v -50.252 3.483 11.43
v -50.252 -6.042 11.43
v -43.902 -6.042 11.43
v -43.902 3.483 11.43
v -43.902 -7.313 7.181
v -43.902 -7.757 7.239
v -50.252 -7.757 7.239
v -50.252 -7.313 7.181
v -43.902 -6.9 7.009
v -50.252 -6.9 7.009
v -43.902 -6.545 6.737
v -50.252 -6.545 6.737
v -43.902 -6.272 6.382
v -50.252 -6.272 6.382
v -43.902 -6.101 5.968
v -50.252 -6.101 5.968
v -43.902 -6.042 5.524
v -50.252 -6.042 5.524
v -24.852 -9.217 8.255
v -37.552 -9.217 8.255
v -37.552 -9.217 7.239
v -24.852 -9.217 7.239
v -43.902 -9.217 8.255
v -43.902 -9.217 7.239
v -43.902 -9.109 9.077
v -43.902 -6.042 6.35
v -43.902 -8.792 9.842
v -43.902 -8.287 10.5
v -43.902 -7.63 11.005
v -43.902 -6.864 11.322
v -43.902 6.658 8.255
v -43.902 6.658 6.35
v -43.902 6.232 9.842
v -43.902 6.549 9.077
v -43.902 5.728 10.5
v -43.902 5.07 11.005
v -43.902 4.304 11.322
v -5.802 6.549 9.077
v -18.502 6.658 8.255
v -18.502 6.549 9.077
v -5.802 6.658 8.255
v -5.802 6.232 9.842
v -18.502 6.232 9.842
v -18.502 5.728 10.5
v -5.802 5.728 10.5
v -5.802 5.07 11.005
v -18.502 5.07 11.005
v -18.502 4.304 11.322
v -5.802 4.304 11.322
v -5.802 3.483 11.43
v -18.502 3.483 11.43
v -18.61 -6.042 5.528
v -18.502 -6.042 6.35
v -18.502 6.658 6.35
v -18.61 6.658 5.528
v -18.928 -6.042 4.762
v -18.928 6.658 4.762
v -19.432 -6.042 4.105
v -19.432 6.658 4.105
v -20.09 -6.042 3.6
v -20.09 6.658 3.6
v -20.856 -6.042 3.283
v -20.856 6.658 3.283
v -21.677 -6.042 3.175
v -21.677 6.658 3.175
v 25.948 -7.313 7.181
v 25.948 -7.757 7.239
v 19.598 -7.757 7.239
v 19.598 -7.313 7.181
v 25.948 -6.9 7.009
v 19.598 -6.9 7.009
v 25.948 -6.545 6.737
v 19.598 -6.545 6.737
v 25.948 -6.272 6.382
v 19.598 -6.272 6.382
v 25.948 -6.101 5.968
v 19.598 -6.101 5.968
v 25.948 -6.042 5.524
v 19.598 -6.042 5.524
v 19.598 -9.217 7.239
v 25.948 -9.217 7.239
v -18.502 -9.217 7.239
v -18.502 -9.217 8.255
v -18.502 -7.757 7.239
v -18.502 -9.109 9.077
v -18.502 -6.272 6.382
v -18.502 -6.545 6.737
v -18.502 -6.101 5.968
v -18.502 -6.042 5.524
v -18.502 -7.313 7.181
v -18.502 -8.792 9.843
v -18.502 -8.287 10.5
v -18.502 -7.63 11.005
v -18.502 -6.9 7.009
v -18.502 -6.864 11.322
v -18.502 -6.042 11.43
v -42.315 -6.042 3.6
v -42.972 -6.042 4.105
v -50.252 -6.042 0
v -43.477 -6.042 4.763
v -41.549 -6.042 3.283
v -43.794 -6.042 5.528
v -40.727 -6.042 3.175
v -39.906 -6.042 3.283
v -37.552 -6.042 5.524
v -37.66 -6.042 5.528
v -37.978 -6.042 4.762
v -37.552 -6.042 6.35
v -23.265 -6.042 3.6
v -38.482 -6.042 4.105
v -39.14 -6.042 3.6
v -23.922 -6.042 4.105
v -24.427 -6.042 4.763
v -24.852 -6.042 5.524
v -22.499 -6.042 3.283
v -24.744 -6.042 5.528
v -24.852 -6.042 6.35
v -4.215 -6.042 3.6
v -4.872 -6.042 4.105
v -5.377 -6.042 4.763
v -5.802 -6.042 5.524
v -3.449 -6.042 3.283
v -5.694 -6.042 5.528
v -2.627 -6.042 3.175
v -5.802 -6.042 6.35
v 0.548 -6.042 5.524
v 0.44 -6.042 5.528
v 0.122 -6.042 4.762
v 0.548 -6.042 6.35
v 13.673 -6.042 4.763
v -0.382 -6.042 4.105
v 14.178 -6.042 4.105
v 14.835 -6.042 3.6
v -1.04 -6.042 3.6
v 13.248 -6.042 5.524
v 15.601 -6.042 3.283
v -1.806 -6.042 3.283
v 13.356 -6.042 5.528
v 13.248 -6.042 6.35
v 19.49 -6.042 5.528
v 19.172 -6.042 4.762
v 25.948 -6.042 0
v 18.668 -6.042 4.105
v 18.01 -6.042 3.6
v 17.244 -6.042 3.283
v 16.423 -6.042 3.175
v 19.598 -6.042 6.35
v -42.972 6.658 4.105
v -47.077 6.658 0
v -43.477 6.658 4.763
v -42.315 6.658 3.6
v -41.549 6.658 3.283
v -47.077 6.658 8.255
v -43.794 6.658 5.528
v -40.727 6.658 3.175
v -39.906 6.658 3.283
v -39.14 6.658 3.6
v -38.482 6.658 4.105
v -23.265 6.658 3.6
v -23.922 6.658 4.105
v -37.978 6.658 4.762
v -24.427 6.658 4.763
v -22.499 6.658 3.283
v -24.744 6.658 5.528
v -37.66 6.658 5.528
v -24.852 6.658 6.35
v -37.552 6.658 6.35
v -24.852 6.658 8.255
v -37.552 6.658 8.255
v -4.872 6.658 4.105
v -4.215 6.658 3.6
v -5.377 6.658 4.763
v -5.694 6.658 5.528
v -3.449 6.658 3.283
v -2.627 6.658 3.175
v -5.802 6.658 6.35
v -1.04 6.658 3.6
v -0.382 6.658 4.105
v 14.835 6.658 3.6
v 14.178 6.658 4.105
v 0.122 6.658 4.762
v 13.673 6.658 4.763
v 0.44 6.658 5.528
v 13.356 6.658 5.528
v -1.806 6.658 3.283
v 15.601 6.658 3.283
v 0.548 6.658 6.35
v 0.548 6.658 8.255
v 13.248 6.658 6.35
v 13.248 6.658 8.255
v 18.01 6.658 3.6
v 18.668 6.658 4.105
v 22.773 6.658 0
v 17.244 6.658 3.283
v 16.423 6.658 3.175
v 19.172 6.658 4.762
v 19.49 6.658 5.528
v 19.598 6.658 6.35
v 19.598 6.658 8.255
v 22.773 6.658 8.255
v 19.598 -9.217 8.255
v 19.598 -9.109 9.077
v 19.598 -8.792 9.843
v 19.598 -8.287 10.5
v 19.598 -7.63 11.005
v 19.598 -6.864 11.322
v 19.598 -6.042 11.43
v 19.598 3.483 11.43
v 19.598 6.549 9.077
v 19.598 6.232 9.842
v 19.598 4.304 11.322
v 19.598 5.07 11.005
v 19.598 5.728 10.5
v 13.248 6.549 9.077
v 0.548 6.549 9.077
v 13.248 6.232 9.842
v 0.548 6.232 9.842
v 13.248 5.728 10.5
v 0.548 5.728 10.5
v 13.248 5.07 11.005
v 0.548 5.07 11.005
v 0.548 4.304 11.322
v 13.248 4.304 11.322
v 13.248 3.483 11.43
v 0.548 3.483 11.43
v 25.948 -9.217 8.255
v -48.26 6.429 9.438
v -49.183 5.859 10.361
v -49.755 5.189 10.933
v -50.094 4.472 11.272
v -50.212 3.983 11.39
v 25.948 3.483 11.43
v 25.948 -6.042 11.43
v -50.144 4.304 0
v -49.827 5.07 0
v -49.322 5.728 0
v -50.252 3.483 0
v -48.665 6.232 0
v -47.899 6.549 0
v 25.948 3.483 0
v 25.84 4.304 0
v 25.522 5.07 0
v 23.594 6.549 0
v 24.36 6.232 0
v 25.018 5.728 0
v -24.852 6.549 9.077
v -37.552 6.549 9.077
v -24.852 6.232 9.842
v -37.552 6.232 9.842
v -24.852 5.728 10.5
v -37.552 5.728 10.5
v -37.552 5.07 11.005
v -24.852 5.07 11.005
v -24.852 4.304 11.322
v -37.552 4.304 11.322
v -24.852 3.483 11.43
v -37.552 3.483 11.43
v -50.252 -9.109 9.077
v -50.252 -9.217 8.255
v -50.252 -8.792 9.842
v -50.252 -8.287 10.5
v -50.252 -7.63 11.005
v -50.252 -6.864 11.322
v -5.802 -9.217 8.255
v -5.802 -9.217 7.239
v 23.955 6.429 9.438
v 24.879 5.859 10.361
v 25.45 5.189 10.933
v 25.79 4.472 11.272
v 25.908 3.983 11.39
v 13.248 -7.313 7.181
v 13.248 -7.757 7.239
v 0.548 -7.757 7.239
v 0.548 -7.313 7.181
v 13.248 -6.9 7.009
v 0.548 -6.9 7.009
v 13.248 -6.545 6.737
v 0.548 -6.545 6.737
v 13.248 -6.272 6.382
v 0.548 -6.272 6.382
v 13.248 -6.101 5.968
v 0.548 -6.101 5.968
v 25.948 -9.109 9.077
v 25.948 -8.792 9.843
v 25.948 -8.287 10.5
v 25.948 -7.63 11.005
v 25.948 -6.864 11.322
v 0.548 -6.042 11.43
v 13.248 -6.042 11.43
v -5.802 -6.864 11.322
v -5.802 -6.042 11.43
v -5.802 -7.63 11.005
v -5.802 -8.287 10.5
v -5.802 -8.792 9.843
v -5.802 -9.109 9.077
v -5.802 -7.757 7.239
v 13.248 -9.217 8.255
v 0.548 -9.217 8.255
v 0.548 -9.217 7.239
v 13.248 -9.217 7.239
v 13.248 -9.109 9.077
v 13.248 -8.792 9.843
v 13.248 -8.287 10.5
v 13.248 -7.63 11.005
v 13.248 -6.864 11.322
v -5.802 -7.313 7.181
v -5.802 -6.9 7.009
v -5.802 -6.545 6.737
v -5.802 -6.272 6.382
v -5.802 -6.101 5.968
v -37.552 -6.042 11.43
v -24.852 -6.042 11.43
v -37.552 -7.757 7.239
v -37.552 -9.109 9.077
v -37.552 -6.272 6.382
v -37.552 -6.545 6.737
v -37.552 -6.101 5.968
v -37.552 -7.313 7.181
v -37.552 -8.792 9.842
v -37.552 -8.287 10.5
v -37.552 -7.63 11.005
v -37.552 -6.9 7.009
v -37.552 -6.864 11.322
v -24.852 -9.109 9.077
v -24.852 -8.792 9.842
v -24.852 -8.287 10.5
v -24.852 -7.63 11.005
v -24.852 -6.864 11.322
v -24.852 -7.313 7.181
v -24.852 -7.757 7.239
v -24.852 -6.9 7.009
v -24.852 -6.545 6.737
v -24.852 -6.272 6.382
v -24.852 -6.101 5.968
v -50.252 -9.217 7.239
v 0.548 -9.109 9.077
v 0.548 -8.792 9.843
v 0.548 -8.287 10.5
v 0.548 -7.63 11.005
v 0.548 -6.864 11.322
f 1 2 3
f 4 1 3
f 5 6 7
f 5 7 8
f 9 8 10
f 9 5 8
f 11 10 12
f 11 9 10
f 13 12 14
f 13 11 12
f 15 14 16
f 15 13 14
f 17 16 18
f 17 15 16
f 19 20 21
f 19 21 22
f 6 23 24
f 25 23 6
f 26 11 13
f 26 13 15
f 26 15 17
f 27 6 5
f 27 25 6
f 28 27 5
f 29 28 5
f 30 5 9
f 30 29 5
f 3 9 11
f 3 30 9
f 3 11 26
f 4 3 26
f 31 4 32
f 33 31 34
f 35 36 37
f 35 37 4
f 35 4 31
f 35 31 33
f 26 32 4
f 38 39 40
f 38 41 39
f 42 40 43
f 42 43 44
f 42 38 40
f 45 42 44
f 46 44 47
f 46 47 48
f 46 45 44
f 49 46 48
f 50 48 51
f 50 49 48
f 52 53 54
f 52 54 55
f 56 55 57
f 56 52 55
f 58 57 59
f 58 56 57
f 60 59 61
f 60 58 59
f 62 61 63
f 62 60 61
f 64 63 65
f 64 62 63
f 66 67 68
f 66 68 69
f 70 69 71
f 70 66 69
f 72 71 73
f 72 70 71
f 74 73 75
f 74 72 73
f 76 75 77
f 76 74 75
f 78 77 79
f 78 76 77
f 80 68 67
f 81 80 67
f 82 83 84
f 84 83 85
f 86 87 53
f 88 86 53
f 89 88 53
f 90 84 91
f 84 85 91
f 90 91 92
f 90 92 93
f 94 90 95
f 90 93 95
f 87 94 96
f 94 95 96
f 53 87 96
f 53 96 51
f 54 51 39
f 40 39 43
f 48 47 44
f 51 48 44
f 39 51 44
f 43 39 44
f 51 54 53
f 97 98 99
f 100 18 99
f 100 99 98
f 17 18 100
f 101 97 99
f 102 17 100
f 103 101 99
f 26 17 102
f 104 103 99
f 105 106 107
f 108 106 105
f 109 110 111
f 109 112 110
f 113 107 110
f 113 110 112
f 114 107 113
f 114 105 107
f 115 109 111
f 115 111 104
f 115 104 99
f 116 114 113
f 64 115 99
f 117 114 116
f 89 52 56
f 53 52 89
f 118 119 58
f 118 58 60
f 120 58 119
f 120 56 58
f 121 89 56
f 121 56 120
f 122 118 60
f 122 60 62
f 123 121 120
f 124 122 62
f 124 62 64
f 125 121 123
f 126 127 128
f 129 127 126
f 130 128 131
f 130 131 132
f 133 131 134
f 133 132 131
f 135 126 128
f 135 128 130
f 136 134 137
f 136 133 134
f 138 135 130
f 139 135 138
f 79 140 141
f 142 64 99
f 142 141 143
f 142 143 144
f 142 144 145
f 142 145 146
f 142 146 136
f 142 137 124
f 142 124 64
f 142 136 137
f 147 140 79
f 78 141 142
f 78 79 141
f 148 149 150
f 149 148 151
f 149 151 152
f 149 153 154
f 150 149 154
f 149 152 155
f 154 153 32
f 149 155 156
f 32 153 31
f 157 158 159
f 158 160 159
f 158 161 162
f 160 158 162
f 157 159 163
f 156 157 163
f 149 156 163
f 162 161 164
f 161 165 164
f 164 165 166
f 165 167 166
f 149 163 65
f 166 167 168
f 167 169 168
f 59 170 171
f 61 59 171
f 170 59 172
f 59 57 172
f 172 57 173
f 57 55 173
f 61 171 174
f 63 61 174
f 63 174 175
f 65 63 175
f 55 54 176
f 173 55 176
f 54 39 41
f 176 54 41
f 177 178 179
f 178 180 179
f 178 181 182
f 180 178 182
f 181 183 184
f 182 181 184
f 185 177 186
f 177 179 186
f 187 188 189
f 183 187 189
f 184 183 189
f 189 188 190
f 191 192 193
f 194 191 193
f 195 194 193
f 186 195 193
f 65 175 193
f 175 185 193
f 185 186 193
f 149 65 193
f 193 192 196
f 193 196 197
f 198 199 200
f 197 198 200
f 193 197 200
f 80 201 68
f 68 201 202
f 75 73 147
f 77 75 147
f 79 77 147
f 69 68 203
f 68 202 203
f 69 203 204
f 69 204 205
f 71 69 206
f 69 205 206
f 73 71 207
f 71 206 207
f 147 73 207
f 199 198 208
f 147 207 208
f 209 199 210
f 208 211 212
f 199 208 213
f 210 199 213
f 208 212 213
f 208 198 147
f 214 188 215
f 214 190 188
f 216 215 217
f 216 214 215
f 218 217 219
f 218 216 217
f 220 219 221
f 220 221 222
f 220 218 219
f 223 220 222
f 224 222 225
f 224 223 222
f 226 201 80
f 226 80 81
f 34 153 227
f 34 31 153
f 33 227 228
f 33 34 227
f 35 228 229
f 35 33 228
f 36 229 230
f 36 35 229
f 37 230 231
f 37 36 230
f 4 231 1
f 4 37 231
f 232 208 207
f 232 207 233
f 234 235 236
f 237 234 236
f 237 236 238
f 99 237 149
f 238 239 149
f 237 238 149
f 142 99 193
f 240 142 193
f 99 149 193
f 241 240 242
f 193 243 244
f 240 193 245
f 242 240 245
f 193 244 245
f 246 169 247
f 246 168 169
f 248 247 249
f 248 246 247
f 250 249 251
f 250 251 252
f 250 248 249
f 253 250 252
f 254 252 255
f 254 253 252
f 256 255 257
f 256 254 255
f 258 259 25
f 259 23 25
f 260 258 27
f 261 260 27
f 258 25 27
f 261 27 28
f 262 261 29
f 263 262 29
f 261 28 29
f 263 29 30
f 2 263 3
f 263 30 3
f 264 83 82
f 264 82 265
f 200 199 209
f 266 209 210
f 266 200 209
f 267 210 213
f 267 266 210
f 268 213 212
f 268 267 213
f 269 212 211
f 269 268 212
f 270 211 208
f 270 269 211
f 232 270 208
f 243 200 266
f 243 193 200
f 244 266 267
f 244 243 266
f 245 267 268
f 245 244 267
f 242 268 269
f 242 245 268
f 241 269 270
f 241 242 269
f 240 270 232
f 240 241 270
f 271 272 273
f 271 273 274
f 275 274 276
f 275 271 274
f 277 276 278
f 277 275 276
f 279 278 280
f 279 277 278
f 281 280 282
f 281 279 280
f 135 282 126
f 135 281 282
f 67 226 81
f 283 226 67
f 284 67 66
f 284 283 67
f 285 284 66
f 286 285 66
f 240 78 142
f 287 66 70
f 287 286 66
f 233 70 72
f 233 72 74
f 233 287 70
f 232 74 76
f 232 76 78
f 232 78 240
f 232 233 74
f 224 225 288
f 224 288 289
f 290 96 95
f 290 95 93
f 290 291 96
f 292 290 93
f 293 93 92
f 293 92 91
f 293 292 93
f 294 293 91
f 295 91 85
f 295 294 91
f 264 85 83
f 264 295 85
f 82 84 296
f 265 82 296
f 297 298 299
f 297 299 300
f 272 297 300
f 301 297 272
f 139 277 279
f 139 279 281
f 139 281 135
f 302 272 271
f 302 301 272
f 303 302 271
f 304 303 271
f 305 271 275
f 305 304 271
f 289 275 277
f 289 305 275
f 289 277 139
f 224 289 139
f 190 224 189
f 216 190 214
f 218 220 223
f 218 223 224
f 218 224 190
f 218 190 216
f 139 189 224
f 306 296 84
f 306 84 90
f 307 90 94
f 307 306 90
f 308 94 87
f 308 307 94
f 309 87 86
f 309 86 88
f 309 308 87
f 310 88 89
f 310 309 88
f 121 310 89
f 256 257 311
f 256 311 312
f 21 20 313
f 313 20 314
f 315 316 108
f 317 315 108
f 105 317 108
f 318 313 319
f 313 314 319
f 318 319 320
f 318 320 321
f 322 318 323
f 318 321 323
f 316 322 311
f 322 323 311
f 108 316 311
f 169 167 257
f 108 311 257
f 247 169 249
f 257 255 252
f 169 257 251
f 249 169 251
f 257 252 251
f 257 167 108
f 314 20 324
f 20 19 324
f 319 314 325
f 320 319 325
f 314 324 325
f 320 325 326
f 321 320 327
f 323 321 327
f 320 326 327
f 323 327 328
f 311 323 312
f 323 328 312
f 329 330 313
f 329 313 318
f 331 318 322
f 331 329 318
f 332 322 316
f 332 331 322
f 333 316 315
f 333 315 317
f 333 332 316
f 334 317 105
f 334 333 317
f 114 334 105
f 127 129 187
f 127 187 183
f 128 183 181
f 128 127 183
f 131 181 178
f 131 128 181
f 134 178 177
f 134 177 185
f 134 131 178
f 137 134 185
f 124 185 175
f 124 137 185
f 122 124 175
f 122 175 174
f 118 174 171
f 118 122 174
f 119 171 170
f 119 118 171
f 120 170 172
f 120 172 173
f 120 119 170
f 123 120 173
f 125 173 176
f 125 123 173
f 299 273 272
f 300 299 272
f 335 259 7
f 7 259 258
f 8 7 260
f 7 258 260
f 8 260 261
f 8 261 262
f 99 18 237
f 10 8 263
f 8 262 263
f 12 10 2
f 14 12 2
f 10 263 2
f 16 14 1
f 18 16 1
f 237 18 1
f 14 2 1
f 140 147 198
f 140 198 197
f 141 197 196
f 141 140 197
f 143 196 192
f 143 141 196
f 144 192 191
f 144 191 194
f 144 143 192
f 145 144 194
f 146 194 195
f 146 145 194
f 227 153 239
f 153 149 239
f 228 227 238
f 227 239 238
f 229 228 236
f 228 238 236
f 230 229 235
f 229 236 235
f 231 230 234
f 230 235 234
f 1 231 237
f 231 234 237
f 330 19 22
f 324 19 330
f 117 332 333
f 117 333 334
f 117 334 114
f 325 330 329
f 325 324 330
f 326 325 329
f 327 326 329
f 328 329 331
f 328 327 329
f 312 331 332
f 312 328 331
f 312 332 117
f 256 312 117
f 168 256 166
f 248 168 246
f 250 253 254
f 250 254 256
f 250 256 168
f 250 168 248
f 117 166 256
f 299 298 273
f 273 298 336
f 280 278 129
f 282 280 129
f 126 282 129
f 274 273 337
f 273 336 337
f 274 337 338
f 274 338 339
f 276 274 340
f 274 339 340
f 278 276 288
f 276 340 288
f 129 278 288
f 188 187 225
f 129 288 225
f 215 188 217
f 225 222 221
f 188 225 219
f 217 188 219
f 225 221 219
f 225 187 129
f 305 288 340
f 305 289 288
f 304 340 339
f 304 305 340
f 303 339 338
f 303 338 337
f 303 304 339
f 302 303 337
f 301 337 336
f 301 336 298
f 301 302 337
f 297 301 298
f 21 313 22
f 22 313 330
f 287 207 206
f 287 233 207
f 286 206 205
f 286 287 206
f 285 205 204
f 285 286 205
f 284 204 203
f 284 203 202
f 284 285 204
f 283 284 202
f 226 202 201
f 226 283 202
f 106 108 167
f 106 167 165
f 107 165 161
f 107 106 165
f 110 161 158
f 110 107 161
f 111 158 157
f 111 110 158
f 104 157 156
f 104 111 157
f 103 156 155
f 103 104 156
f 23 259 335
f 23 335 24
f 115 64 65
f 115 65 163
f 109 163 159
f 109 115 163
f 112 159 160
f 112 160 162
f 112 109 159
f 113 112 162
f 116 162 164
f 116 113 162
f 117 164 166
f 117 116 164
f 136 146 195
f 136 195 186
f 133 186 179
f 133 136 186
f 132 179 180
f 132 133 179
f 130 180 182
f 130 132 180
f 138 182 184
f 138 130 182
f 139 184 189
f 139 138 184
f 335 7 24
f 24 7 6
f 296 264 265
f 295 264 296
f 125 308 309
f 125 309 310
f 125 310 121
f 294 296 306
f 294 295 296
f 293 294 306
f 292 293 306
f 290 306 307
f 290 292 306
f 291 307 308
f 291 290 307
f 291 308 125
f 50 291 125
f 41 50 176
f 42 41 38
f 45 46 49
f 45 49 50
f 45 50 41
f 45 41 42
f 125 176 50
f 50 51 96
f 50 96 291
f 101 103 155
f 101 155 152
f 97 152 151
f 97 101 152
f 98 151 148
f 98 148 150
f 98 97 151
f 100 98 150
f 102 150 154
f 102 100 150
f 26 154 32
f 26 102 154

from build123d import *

# Parameters (mm, degrees)
F0_W      = 76.2
F0_H      = 12.7
F1_DEPTH  = 3.175
F2_W      = 6.35
F2_H      = 12.7
F2_W_2    = 12.7
F3_DEPTH  = 8.255
F4_W      = 6.35
F4_H      = 4.191
F4_W_2    = 12.7
F5_DEPTH  = 3.175
F7_DEPTH  = 6.35
F9_DEPTH  = 12.7
F11_DEPTH = 12.7
F13_DEPTH = 12.7
F15_DEPTH = 6.35
F17_DEPTH = 12.7
F18_R     = 3.175


with BuildPart() as f1:
    # F0 (on Top) → F1 (new body)
    with BuildSketch(Plane.XY):
        with Locations((-12.1522513986, 0.3075693393)):
            Rectangle(F0_W, F0_H)
    extrude(amount=F1_DEPTH)

    # F2 (on face) → F3 (join)
    with BuildSketch(Plane.XY.offset(3.175)):
        with Locations((-47.0772513986, 0.3075693393)):
            Rectangle(F2_W, F2_H)
        with Locations((-31.2022513986, 0.3075693393)):
            Rectangle(F2_W_2, F2_H)
        with Locations((-12.1522513986, 0.3075693393)):
            Rectangle(F2_W_2, F2_H)
        with Locations((6.8977486014, 0.3075693393)):
            Rectangle(F2_W_2, F2_H)
        with Locations((22.7727486014, 0.3075693393)):
            Rectangle(F2_W, F2_H)
    extrude(amount=F3_DEPTH)

    # F4 (on face) → F5 (join)
    with BuildSketch(Plane.XZ.offset(6.0424306607)):
        with Locations((-47.0772513986, 9.3345)):
            Rectangle(F4_W, F4_H)
        with Locations((-31.2022513986, 9.3345)):
            Rectangle(F4_W_2, F4_H)
        with Locations((-12.1522513986, 9.3345)):
            Rectangle(F4_W_2, F4_H)
        with Locations((6.8977486014, 9.3345)):
            Rectangle(F4_W_2, F4_H)
        with Locations((22.7727486014, 9.3345)):
            Rectangle(F4_W, F4_H)
    extrude(amount=F5_DEPTH)

    # F6 (on face) → F7 (join)
    with BuildSketch(Plane.YZ.offset(25.9477486014)):
        with BuildLine():
            Line((-6.0424306607, 7.239), (-7.7569306607, 7.239))
            ThreePointArc((-7.7569306607, 7.239), (-6.5445960844, 6.7368345763), (-6.0424306607, 5.5245))
            Line((-6.0424306607, 5.5245), (-6.0424306607, 7.239))
        make_face()
    extrude(amount=-F7_DEPTH)

    # F8 (on face) → F9 (join)
    with BuildSketch(Plane.YZ.offset(13.2477486014)):
        with BuildLine():
            Line((-6.0424306607, 7.239), (-7.7569306607, 7.239))
            ThreePointArc((-7.7569306607, 7.239), (-6.5445960844, 6.7368345763), (-6.0424306607, 5.5245))
            Line((-6.0424306607, 5.5245), (-6.0424306607, 7.239))
        make_face()
    extrude(amount=-F9_DEPTH)

    # F10 (on face) → F11 (join)
    with BuildSketch(Plane.YZ.offset(-5.8022513986)):
        with BuildLine():
            Line((-6.0424306607, 7.239), (-7.7569306607, 7.239))
            ThreePointArc((-7.7569306607, 7.239), (-6.5445960844, 6.7368345763), (-6.0424306607, 5.5245))
            Line((-6.0424306607, 5.5245), (-6.0424306607, 7.239))
        make_face()
    extrude(amount=-F11_DEPTH)

    # F12 (on face) → F13 (join)
    with BuildSketch(Plane.YZ.offset(-24.8522513986)):
        with BuildLine():
            Line((-6.0424306607, 7.239), (-7.7569306607, 7.239))
            ThreePointArc((-7.7569306607, 7.239), (-6.5445960844, 6.7368345763), (-6.0424306607, 5.5245))
            Line((-6.0424306607, 5.5245), (-6.0424306607, 7.239))
        make_face()
    extrude(amount=-F13_DEPTH)

    # F14 (on face) → F15 (join)
    with BuildSketch(Plane.YZ.offset(-43.9022513986)):
        with BuildLine():
            Line((-6.0424306607, 7.239), (-7.7569306607, 7.239))
            ThreePointArc((-7.7569306607, 7.239), (-6.5445960844, 6.7368345763), (-6.0424306607, 5.5245))
            Line((-6.0424306607, 5.5245), (-6.0424306607, 7.239))
        make_face()
    extrude(amount=-F15_DEPTH)

    # F16 (on face) → F17 (join)
    with BuildSketch(Plane.XZ.offset(6.0424306607)):
        with BuildLine():
            ThreePointArc((-40.7272513986, 3.175), (-42.9723154288, 4.1049359697), (-43.9022513986, 6.35))
            Line((-43.9022513986, 6.35), (-43.9022513986, 5.5245))
            Line((-43.9022513986, 5.5245), (-43.9022513986, 3.175))
            Line((-43.9022513986, 3.175), (-40.7272513986, 3.175))
        make_face()
        with BuildLine():
            ThreePointArc((-37.5522513986, 6.35), (-38.4821873683, 4.1049359697), (-40.7272513986, 3.175))
            Line((-40.7272513986, 3.175), (-37.5522513986, 3.175))
            Line((-37.5522513986, 3.175), (-37.5522513986, 5.5245))
            Line((-37.5522513986, 5.5245), (-37.5522513986, 6.35))
        make_face()
        with BuildLine():
            Line((-24.8522513986, 6.35), (-24.8522513986, 5.5245))
            Line((-24.8522513986, 5.5245), (-24.8522513986, 3.175))
            Line((-24.8522513986, 3.175), (-21.6772513986, 3.175))
            ThreePointArc((-21.6772513986, 3.175), (-23.9223154288, 4.1049359697), (-24.8522513986, 6.35))
        make_face()
        with BuildLine():
            ThreePointArc((-18.5022513986, 6.35), (-19.4321873683, 4.1049359697), (-21.6772513986, 3.175))
            Line((-21.6772513986, 3.175), (-18.5022513986, 3.175))
            Line((-18.5022513986, 3.175), (-18.5022513986, 5.5245))
            Line((-18.5022513986, 5.5245), (-18.5022513986, 6.35))
        make_face()
        with BuildLine():
            Line((-5.8022513986, 6.35), (-5.8022513986, 5.5245))
            Line((-5.8022513986, 5.5245), (-5.8022513986, 3.175))
            Line((-5.8022513986, 3.175), (-2.6272513986, 3.175))
            ThreePointArc((-2.6272513986, 3.175), (-4.8723154288, 4.1049359697), (-5.8022513986, 6.35))
        make_face()
        with BuildLine():
            Line((0.5477486014, 3.175), (0.5477486014, 5.5245))
            Line((0.5477486014, 5.5245), (0.5477486014, 6.35))
            ThreePointArc((0.5477486014, 6.35), (-0.3821873683, 4.1049359697), (-2.6272513986, 3.175))
            Line((-2.6272513986, 3.175), (0.5477486014, 3.175))
        make_face()
        with BuildLine():
            Line((13.2477486014, 3.175), (16.4227486014, 3.175))
            ThreePointArc((16.4227486014, 3.175), (14.1776845712, 4.1049359697), (13.2477486014, 6.35))
            Line((13.2477486014, 6.35), (13.2477486014, 5.5245))
            Line((13.2477486014, 5.5245), (13.2477486014, 3.175))
        make_face()
        with BuildLine():
            Line((19.5977486014, 3.175), (19.5977486014, 5.5245))
            Line((19.5977486014, 5.5245), (19.5977486014, 6.35))
            ThreePointArc((19.5977486014, 6.35), (18.6678126317, 4.1049359697), (16.4227486014, 3.175))
            Line((16.4227486014, 3.175), (19.5977486014, 3.175))
        make_face()
    extrude(amount=-F17_DEPTH)

    # F18
    f18_edges = [f1.edges().sort_by_distance(p)[0] for p in [
        (22.772749, 6.657569, 11.43),
        (6.897749, 6.657569, 11.43),
        (-12.152251, 6.657569, 11.43),
        (-31.202251, 6.657569, 11.43),
        (-47.077251, 6.657569, 11.43),
        (-47.077251, -9.217431, 11.43),
        (-31.202251, -9.217431, 11.43),
        (-12.152251, -9.217431, 11.43),
        (6.897749, -9.217431, 11.43),
        (22.772749, -9.217431, 11.43),
        (-50.252251, 6.657569, 5.715),
        (25.947749, 6.657569, 5.715),
    ]]
    fillet(f18_edges, radius=F18_R)


solid = f1.part
